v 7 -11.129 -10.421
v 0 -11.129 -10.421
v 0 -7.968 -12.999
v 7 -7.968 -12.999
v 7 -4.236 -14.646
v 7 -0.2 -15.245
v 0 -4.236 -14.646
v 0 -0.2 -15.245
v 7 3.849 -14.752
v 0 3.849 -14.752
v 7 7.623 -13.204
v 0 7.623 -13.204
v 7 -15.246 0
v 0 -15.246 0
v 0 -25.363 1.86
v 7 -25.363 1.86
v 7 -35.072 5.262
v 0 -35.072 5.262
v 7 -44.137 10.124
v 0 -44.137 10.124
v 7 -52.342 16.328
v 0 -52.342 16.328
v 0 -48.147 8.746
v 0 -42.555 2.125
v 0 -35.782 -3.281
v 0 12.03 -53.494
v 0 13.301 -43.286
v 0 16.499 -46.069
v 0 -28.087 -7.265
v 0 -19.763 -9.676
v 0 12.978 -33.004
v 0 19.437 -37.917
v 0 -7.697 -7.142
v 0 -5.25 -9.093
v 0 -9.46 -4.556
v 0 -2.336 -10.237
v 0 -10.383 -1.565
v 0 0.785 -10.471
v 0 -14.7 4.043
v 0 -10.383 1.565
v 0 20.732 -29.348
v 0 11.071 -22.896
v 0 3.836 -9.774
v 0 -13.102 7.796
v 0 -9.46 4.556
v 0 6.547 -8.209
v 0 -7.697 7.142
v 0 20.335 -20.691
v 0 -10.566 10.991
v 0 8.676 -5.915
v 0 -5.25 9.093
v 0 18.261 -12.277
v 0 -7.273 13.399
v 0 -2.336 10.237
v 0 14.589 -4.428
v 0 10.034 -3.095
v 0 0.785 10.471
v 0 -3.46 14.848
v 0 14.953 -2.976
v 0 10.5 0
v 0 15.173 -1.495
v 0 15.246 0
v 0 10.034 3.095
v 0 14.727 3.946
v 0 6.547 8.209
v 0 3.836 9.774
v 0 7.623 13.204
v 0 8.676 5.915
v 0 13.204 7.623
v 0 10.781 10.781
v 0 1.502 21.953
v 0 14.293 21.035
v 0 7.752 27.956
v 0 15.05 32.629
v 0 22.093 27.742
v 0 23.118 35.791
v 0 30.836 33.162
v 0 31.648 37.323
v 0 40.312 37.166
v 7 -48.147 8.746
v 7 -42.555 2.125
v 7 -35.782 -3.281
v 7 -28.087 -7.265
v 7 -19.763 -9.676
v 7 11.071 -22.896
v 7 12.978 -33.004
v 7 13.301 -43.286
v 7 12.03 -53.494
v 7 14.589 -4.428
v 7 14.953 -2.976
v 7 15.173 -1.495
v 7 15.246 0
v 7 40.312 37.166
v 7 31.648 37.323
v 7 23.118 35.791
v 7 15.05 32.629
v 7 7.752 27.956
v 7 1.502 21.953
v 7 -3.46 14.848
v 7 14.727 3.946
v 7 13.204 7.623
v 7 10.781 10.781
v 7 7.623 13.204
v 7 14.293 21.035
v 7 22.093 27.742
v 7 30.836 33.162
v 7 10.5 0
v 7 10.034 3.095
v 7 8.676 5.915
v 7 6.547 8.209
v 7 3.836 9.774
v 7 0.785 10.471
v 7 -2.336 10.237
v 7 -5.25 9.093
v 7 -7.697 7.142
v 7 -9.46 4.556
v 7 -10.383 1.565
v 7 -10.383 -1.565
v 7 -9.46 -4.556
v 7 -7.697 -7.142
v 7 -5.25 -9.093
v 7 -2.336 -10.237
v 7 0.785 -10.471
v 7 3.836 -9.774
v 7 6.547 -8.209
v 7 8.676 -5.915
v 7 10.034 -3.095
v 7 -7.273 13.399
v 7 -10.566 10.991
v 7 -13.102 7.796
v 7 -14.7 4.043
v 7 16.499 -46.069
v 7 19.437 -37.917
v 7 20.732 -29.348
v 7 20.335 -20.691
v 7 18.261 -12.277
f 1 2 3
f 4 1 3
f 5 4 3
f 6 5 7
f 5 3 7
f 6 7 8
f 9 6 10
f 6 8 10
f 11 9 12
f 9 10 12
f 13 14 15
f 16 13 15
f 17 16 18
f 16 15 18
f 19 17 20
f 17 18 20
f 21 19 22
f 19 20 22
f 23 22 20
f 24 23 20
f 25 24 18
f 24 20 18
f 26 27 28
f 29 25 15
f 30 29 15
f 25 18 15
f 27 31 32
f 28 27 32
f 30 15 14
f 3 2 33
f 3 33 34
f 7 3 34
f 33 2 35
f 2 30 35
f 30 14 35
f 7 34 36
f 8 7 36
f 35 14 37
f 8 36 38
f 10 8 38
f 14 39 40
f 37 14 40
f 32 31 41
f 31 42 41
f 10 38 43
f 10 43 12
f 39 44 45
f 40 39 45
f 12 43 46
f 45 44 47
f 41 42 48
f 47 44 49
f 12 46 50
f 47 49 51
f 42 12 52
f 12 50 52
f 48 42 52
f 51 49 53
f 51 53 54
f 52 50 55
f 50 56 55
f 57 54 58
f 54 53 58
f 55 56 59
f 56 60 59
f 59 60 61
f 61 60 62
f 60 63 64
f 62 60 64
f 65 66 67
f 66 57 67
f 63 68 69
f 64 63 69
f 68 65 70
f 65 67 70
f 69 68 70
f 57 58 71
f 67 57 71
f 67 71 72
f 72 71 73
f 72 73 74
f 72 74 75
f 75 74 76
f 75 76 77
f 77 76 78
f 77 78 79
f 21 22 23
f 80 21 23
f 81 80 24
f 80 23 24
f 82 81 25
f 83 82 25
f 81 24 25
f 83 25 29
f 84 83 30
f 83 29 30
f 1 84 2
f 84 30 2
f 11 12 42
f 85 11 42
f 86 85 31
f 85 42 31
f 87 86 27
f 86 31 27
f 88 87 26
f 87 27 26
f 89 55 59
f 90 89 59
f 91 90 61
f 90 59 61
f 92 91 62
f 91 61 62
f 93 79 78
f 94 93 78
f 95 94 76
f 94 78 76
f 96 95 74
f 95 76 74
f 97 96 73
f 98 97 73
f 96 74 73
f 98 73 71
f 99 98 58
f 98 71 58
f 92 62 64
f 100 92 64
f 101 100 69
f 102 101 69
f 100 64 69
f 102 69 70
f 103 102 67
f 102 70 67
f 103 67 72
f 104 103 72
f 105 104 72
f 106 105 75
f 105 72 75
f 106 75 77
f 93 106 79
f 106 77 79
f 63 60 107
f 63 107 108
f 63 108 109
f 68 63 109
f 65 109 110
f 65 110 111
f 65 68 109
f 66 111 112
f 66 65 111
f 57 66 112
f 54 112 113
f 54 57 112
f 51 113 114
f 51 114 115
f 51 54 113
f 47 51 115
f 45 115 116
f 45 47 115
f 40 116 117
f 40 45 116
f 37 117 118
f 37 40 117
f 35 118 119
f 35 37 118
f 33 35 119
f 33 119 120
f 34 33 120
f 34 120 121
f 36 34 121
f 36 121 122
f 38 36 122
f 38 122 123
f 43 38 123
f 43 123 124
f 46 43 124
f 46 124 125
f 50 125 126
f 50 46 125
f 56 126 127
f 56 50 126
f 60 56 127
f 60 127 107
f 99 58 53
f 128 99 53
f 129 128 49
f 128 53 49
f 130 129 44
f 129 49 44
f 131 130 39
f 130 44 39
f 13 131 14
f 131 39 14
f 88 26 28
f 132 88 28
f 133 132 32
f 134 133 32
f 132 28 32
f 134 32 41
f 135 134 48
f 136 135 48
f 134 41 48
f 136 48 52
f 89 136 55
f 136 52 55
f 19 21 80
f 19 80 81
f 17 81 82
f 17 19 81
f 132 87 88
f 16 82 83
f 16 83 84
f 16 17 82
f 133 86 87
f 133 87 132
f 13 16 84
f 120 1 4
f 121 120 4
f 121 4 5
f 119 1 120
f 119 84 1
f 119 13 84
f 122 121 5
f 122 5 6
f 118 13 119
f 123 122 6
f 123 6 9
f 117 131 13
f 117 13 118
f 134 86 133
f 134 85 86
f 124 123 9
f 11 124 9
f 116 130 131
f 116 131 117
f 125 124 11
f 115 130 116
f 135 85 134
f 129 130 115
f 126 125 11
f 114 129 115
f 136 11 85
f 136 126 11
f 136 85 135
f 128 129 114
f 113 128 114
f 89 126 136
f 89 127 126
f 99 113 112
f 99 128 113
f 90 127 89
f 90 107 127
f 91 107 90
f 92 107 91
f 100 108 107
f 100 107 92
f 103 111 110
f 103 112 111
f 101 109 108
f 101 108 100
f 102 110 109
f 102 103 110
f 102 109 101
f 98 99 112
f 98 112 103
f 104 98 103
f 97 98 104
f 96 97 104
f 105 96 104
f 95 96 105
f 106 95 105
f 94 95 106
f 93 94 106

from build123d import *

# Parameters (mm, degrees)
F1_DEPTH = 7
F2_DEPTH = 7
F3_DEPTH = 7
F0_R     = 10.5
F4_DEPTH = 7


with BuildPart() as f1:
    # F0 (on Right) → F1 (new body)
    with BuildSketch(Plane.YZ):
        with BuildLine():
            ThreePointArc((14.589096, -4.427731), (11.941496, -9.478775), (7.623098, -13.203594))
            ThreePointArc((7.623098, -13.203594), (12.978421, -33.004131), (12.030362, -53.494177))
            ThreePointArc((12.030362, -53.494177), (20.732247, -29.348026), (14.589096, -4.427731))
        make_face()
    extrude(amount=F1_DEPTH)



with BuildPart() as f2:
    # F0 (on Right) → F2 (new body)
    with BuildSketch(Plane.YZ):
        with BuildLine():
            ThreePointArc((-15.246197, 0), (-35.071627, 5.262423), (-52.342497, 16.328489))
            ThreePointArc((-52.342497, 16.328489), (-35.78226, -3.28064), (-11.129076, -10.420662))
            ThreePointArc((-11.129076, -10.420662), (-14.179608, -5.602251), (-15.246197, 0))
        make_face()
    extrude(amount=F2_DEPTH)


with BuildPart() as f3:
    # F0 (on Right) → F3 (new body)
    with BuildSketch(Plane.YZ):
        with BuildLine():
            ThreePointArc((40.312135, 37.165687), (15.050012, 32.628666), (-3.46002, 14.848393))
            ThreePointArc((-3.46002, 14.848393), (2.238112, 15.081027), (7.623098, 13.203594))
            ThreePointArc((7.623098, 13.203594), (22.093206, 27.741708), (40.312135, 37.165687))
        make_face()
    extrude(amount=F3_DEPTH)


with BuildPart() as f1_1:
    add(f1.part)

    add(f2.part)  # F4 merges F2

    add(f3.part)  # F4 merges F3
    # F0 (on Right) → F4 (join)
    with BuildSketch(Plane.YZ):
        with BuildLine():
            ThreePointArc((-3.46002, 14.848393), (-11.941496, 9.478775), (-15.246197, 0))
            ThreePointArc((-15.246197, 0), (-14.179608, -5.602251), (-11.129076, -10.420662))
            ThreePointArc((-11.129076, -10.420662), (-2.238112, -15.081027), (7.623098, -13.203594))
            ThreePointArc((7.623098, -13.203594), (11.941496, -9.478775), (14.589096, -4.427731))
            ThreePointArc((14.589096, -4.427731), (15.081027, -2.238112), (15.246197, 0))
            ThreePointArc((15.246197, 0), (13.203594, 7.623098), (7.623098, 13.203594))
            ThreePointArc((7.623098, 13.203594), (2.238112, 15.081027), (-3.46002, 14.848393))
        make_face()
        Circle(F0_R, mode=Mode.SUBTRACT)
    extrude(amount=F4_DEPTH)


solid = f1_1.part
